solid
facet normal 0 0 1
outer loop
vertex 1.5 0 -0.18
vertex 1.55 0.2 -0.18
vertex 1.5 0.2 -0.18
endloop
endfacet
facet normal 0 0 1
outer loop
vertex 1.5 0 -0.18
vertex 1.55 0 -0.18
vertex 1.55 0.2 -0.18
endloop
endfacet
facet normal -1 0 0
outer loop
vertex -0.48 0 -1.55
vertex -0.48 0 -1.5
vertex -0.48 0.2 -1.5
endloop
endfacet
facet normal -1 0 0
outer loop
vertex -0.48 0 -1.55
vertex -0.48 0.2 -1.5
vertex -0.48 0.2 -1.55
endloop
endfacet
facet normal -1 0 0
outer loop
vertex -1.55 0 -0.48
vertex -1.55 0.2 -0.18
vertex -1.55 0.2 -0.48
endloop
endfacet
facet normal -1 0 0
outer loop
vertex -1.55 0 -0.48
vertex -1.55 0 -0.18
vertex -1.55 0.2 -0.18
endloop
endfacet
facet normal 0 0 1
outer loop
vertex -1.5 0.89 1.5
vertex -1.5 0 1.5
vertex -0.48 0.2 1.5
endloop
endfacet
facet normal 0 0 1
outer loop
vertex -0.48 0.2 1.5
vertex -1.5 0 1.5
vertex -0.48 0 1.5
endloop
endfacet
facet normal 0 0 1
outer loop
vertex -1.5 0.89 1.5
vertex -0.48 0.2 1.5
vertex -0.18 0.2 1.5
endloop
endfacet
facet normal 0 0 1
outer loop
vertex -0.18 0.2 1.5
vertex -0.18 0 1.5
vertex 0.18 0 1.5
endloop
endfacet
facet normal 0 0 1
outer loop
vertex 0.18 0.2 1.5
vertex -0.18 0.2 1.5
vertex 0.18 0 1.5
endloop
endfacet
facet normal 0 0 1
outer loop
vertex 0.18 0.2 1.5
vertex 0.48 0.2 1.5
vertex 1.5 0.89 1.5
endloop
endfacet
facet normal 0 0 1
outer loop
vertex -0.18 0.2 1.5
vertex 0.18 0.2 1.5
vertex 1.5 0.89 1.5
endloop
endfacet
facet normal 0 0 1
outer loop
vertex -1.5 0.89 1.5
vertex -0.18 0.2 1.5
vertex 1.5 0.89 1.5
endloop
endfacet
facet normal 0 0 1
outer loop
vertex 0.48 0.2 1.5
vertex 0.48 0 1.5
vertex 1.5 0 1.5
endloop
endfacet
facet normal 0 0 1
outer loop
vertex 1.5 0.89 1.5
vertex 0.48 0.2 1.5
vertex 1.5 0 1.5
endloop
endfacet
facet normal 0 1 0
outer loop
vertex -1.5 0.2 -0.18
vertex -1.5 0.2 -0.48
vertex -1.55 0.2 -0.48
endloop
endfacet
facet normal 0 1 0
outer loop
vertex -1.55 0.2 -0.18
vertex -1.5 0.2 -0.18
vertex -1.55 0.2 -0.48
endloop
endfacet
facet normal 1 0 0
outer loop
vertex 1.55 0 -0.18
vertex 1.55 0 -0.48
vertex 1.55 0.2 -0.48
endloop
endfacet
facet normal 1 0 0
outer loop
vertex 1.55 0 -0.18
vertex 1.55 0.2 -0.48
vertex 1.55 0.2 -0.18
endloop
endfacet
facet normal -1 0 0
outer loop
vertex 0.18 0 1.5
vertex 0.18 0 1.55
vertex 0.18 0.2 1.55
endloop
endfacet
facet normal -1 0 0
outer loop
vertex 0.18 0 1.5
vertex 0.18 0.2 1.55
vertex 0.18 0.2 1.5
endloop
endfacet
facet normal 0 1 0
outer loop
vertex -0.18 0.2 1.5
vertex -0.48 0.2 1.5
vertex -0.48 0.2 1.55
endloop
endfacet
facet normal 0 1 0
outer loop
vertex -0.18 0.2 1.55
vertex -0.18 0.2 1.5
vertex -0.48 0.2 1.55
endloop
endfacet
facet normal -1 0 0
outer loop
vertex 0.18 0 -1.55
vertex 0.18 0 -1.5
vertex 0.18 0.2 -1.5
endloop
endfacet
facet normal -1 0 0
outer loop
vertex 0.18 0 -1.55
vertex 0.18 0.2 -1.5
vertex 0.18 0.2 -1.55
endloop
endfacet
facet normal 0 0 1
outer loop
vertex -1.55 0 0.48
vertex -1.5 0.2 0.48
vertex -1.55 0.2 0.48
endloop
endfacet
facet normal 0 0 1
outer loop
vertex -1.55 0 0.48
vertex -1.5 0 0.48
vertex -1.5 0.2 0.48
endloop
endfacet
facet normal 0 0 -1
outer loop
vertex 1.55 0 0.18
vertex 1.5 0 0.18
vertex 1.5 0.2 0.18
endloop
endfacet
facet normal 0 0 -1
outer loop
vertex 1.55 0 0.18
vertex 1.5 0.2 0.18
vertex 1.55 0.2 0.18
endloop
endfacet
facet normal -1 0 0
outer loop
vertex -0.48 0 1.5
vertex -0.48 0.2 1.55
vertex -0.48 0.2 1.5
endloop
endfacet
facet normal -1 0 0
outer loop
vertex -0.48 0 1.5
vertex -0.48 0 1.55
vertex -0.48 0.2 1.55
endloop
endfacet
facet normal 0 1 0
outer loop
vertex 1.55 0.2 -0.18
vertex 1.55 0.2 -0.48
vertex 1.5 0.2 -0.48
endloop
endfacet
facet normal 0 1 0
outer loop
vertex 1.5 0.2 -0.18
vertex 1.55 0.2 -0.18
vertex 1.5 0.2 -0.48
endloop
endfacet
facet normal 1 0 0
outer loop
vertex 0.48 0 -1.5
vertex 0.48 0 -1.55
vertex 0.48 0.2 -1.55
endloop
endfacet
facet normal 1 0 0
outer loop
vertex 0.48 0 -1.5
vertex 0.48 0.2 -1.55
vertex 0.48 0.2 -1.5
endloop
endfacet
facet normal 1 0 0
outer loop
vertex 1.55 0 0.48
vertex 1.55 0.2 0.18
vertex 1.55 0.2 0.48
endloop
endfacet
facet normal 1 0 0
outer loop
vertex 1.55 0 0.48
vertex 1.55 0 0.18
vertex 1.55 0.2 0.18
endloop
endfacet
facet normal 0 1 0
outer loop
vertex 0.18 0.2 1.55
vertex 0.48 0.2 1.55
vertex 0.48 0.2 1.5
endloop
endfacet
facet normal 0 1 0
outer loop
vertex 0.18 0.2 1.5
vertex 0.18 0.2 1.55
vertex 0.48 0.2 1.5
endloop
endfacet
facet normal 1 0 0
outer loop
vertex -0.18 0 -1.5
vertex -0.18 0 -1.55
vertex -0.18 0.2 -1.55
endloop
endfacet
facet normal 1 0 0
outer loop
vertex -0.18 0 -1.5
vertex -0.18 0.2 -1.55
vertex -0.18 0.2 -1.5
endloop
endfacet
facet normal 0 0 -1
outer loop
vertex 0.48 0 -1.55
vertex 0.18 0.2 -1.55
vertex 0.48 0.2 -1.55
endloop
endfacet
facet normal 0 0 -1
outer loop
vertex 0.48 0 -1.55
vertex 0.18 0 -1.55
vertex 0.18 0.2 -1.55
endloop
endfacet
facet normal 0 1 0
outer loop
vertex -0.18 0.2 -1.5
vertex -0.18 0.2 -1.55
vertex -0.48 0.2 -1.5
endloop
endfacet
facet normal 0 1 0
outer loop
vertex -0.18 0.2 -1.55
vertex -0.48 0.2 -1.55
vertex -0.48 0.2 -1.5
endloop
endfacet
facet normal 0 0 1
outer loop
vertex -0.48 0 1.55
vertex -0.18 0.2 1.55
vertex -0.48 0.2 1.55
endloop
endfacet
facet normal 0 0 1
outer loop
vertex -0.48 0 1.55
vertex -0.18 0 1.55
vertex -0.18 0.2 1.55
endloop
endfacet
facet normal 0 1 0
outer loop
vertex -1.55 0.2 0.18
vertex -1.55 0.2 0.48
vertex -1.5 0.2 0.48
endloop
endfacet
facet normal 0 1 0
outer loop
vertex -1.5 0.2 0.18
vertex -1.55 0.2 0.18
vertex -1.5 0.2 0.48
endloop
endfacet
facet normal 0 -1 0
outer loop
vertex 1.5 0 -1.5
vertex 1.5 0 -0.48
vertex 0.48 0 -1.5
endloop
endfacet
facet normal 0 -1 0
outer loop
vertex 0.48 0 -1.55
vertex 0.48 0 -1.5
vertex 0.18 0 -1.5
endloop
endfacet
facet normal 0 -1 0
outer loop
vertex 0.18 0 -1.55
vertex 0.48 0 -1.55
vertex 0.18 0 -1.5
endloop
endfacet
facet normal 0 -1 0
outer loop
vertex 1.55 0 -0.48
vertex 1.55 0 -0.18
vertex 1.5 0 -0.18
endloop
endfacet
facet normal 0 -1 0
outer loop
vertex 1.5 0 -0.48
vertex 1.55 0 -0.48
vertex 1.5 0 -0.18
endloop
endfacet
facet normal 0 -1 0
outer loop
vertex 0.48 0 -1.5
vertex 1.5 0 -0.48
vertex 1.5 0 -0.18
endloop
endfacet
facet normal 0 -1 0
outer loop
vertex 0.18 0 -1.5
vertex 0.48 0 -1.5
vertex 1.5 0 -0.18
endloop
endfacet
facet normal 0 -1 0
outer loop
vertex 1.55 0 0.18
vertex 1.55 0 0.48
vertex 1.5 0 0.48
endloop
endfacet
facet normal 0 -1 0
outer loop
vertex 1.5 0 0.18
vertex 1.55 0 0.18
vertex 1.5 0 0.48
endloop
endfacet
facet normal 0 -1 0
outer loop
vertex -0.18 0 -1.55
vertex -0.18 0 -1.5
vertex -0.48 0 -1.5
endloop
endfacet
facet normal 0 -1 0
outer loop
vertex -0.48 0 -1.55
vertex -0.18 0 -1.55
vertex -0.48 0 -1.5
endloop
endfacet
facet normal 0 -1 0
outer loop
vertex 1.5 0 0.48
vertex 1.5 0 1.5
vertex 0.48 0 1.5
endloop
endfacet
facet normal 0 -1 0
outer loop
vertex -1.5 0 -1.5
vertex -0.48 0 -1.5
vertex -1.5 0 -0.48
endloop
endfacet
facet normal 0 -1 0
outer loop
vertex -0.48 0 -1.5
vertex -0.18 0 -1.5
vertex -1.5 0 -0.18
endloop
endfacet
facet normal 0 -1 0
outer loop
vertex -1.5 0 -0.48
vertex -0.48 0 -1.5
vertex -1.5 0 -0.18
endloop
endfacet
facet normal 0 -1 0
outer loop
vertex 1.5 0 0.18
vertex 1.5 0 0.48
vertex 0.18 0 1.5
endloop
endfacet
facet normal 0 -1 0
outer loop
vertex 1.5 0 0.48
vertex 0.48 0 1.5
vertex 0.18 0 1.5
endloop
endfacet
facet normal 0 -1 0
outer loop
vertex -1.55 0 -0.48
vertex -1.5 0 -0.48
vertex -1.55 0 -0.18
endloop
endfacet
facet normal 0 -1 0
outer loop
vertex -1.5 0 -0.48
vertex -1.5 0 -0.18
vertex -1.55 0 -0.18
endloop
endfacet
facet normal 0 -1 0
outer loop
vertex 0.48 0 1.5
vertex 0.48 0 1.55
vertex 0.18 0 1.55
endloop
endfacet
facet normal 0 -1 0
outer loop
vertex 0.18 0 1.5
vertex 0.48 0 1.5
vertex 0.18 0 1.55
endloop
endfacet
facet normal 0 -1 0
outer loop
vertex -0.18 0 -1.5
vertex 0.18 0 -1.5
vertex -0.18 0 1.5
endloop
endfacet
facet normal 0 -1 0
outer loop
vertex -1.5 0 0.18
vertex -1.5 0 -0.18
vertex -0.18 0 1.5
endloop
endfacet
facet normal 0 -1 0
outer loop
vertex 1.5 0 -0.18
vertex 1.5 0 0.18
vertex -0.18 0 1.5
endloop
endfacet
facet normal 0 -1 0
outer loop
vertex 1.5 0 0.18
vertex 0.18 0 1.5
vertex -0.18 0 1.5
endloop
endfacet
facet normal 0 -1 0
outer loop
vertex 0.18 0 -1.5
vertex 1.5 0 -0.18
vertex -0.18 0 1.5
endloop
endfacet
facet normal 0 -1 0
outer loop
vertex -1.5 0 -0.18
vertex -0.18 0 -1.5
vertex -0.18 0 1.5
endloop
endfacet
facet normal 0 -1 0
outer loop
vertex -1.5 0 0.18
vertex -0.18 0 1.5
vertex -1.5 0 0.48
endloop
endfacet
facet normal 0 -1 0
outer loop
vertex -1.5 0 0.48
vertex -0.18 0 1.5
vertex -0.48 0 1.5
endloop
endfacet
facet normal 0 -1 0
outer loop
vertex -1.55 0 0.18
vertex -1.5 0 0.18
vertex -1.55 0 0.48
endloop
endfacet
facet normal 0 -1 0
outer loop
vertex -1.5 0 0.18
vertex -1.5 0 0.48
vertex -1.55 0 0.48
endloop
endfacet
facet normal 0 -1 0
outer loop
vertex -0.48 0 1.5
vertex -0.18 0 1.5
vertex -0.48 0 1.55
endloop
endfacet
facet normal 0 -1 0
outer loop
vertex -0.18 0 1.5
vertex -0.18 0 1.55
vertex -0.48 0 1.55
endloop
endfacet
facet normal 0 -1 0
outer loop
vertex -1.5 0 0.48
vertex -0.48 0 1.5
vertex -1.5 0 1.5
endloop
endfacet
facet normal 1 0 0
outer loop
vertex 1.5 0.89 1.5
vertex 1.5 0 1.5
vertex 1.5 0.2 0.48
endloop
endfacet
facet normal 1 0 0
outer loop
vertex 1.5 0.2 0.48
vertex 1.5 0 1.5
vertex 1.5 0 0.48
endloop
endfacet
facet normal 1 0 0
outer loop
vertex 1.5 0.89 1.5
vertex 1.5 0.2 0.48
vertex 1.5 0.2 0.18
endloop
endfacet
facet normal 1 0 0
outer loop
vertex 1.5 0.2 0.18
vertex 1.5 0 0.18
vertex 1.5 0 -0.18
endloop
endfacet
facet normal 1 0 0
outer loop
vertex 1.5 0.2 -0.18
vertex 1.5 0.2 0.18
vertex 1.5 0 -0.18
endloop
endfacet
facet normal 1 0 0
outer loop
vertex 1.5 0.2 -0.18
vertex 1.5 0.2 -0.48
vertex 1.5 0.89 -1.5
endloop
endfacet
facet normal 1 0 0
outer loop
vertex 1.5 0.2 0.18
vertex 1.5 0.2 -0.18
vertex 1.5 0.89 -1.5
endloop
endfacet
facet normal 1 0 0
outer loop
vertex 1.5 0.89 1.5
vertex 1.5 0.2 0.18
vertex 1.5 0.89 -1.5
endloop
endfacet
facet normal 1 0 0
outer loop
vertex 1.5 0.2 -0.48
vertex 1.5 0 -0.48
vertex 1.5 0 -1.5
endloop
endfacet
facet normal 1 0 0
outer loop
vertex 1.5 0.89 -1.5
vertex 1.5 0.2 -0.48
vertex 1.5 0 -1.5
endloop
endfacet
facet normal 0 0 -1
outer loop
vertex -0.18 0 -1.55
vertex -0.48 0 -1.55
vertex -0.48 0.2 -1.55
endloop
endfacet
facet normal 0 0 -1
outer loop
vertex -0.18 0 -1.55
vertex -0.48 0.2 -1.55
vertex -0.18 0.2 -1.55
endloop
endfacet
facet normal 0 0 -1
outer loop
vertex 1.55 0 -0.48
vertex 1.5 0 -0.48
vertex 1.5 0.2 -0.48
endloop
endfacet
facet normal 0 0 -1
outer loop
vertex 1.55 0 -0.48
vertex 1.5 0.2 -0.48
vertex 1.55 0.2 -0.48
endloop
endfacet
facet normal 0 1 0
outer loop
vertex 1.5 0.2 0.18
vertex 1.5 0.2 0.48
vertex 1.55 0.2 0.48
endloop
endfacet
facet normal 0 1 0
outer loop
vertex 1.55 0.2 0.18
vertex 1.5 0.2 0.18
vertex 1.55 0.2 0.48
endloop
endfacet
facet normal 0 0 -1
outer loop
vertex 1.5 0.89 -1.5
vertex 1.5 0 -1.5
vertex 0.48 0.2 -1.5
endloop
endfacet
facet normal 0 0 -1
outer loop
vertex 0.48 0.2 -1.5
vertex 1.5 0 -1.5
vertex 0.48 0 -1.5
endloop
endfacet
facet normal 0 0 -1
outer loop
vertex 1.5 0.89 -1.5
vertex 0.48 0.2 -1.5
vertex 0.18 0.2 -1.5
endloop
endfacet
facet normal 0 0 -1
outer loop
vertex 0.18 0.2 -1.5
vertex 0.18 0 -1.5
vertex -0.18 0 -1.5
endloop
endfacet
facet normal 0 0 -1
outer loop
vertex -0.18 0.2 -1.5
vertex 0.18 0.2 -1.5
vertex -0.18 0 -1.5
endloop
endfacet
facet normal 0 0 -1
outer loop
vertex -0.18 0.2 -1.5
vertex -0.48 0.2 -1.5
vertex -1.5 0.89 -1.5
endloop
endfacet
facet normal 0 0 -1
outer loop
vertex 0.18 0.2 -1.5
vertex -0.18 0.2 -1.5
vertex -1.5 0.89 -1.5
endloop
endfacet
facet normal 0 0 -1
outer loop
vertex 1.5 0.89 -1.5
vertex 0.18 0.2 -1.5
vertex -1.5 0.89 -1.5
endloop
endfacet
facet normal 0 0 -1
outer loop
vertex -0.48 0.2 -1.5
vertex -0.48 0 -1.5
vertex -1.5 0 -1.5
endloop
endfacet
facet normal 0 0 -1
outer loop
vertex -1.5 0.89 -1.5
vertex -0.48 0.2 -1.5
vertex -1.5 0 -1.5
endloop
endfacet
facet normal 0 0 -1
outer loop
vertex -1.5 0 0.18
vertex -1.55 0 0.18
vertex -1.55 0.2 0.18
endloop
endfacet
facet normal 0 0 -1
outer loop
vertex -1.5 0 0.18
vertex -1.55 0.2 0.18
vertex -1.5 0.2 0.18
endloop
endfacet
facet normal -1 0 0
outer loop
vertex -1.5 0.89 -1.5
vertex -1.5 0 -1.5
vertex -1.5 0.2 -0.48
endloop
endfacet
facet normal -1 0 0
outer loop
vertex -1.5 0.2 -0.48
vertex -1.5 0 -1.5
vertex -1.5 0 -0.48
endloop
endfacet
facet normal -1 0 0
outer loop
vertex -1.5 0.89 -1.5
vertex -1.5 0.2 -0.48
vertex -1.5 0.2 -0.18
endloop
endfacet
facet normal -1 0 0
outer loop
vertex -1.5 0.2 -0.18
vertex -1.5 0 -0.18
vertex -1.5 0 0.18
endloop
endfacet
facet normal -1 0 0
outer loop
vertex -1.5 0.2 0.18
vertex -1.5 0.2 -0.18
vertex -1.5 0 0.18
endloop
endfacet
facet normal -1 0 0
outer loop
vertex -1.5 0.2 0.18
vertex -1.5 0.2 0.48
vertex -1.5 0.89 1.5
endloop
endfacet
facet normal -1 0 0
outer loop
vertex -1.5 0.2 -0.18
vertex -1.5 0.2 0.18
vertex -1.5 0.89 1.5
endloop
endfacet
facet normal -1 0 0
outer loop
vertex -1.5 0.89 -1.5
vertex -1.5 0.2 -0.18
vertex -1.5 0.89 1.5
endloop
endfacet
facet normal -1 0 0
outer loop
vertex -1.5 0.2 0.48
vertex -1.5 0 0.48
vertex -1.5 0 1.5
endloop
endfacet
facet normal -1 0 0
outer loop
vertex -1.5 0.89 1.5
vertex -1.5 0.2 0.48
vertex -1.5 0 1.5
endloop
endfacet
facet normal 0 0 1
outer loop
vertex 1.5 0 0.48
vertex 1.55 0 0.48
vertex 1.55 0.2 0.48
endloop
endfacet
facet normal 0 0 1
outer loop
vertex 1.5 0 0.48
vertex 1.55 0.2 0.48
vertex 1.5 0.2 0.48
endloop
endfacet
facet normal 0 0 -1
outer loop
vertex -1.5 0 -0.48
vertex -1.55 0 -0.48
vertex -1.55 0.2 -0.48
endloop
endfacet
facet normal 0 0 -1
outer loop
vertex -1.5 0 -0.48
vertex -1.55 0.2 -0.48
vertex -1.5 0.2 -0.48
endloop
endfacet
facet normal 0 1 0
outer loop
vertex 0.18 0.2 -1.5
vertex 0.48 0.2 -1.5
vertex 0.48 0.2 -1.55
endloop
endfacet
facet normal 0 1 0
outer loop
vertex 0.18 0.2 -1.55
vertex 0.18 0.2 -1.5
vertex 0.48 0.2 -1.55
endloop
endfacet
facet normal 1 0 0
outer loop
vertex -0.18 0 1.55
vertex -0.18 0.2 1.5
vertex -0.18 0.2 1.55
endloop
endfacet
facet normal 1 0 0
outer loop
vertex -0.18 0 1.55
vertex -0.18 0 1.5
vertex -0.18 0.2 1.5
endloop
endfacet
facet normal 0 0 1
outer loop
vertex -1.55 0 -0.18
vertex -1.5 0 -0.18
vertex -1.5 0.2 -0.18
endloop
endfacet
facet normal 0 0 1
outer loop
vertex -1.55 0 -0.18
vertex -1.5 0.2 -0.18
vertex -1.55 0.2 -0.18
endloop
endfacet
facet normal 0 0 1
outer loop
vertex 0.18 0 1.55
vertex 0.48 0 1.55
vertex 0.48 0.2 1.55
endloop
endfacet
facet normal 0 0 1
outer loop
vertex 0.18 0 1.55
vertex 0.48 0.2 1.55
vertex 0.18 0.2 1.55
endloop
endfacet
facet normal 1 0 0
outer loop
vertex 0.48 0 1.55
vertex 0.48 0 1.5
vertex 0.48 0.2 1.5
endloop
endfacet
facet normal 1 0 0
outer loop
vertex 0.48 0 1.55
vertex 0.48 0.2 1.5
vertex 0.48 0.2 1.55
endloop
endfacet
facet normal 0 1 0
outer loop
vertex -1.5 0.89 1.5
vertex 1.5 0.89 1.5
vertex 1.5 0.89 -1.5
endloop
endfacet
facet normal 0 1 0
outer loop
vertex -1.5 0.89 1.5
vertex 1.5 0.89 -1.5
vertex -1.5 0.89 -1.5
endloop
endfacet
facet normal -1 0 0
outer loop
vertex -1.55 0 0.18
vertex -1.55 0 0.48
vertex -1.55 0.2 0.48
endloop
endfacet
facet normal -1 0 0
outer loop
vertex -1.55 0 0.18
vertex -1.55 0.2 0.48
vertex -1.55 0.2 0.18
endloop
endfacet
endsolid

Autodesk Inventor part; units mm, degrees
ref_plane "YZ Plane" through (0, 0, 0) normal (1, 0, 0) x (0, 1, 0)
ref_plane "XZ Plane" through (0, 0, 0) normal (0, 1, 0) x (-1, 0, 0)
ref_plane "XY Plane" through (0, 0, 0) normal (0, 0, 1) x (1, 0, 0)
sketch "Sketch1" plane through (0, 0, 0) normal (0, 1, 0) x (-1, 0, 0)
  line L0 (1.5, 1.5) -> (-1.5, 1.5)
  line L1 (-1.5, 1.5) -> (-1.5, -1.5)
  line L2 (-1.5, -1.5) -> (1.5, -1.5)
  line L3 (1.5, -1.5) -> (1.5, 1.5)
  point P0 (0, 0)
  dimension "d0" = 3
  dimension "d1" = 3
  dimension "d2" = 1.5
  dimension "d3" = 1.5
extrude "Extrusion1" add sketch "Sketch1" along normal blind 0.89
sketch "Sketch2" plane through (0, 0, 0) normal (0, -1, 0) x (1, 0, 0)
  line L0 (1.55, 0.48) -> (1.14, 0.48)
  line L1 (1.14, 0.48) -> (1.14, 0.18)
  line L2 (1.14, 0.18) -> (1.55, 0.18)
  line L3 (1.55, 0.18) -> (1.55, 0.48)
  line L4 (1.5, 1.5) -> (1.5, -1.5) projected
  line L5 (-1.5, 1.5) -> (1.5, 1.5) projected
  point P0 (0, 0)
  dimension "d6" = 0.3
  dimension "d7" = 0.05
  dimension "d8" = 0.41
  dimension "d9" = 1.02
extrude "Extrusion2" add sketch "Sketch2" against normal blind 0.2
mirror "Mirror1" about plane through (0, 0, 0) normal (0, 0, 1) of "Extrusion2"
pattern_circular "Circular Pattern1" count 4 over 360 about axis through (0, -10, 0) along (0, 1, 0) of "Extrusion2", "Mirror1"
properties part number "MC_DQ849"
